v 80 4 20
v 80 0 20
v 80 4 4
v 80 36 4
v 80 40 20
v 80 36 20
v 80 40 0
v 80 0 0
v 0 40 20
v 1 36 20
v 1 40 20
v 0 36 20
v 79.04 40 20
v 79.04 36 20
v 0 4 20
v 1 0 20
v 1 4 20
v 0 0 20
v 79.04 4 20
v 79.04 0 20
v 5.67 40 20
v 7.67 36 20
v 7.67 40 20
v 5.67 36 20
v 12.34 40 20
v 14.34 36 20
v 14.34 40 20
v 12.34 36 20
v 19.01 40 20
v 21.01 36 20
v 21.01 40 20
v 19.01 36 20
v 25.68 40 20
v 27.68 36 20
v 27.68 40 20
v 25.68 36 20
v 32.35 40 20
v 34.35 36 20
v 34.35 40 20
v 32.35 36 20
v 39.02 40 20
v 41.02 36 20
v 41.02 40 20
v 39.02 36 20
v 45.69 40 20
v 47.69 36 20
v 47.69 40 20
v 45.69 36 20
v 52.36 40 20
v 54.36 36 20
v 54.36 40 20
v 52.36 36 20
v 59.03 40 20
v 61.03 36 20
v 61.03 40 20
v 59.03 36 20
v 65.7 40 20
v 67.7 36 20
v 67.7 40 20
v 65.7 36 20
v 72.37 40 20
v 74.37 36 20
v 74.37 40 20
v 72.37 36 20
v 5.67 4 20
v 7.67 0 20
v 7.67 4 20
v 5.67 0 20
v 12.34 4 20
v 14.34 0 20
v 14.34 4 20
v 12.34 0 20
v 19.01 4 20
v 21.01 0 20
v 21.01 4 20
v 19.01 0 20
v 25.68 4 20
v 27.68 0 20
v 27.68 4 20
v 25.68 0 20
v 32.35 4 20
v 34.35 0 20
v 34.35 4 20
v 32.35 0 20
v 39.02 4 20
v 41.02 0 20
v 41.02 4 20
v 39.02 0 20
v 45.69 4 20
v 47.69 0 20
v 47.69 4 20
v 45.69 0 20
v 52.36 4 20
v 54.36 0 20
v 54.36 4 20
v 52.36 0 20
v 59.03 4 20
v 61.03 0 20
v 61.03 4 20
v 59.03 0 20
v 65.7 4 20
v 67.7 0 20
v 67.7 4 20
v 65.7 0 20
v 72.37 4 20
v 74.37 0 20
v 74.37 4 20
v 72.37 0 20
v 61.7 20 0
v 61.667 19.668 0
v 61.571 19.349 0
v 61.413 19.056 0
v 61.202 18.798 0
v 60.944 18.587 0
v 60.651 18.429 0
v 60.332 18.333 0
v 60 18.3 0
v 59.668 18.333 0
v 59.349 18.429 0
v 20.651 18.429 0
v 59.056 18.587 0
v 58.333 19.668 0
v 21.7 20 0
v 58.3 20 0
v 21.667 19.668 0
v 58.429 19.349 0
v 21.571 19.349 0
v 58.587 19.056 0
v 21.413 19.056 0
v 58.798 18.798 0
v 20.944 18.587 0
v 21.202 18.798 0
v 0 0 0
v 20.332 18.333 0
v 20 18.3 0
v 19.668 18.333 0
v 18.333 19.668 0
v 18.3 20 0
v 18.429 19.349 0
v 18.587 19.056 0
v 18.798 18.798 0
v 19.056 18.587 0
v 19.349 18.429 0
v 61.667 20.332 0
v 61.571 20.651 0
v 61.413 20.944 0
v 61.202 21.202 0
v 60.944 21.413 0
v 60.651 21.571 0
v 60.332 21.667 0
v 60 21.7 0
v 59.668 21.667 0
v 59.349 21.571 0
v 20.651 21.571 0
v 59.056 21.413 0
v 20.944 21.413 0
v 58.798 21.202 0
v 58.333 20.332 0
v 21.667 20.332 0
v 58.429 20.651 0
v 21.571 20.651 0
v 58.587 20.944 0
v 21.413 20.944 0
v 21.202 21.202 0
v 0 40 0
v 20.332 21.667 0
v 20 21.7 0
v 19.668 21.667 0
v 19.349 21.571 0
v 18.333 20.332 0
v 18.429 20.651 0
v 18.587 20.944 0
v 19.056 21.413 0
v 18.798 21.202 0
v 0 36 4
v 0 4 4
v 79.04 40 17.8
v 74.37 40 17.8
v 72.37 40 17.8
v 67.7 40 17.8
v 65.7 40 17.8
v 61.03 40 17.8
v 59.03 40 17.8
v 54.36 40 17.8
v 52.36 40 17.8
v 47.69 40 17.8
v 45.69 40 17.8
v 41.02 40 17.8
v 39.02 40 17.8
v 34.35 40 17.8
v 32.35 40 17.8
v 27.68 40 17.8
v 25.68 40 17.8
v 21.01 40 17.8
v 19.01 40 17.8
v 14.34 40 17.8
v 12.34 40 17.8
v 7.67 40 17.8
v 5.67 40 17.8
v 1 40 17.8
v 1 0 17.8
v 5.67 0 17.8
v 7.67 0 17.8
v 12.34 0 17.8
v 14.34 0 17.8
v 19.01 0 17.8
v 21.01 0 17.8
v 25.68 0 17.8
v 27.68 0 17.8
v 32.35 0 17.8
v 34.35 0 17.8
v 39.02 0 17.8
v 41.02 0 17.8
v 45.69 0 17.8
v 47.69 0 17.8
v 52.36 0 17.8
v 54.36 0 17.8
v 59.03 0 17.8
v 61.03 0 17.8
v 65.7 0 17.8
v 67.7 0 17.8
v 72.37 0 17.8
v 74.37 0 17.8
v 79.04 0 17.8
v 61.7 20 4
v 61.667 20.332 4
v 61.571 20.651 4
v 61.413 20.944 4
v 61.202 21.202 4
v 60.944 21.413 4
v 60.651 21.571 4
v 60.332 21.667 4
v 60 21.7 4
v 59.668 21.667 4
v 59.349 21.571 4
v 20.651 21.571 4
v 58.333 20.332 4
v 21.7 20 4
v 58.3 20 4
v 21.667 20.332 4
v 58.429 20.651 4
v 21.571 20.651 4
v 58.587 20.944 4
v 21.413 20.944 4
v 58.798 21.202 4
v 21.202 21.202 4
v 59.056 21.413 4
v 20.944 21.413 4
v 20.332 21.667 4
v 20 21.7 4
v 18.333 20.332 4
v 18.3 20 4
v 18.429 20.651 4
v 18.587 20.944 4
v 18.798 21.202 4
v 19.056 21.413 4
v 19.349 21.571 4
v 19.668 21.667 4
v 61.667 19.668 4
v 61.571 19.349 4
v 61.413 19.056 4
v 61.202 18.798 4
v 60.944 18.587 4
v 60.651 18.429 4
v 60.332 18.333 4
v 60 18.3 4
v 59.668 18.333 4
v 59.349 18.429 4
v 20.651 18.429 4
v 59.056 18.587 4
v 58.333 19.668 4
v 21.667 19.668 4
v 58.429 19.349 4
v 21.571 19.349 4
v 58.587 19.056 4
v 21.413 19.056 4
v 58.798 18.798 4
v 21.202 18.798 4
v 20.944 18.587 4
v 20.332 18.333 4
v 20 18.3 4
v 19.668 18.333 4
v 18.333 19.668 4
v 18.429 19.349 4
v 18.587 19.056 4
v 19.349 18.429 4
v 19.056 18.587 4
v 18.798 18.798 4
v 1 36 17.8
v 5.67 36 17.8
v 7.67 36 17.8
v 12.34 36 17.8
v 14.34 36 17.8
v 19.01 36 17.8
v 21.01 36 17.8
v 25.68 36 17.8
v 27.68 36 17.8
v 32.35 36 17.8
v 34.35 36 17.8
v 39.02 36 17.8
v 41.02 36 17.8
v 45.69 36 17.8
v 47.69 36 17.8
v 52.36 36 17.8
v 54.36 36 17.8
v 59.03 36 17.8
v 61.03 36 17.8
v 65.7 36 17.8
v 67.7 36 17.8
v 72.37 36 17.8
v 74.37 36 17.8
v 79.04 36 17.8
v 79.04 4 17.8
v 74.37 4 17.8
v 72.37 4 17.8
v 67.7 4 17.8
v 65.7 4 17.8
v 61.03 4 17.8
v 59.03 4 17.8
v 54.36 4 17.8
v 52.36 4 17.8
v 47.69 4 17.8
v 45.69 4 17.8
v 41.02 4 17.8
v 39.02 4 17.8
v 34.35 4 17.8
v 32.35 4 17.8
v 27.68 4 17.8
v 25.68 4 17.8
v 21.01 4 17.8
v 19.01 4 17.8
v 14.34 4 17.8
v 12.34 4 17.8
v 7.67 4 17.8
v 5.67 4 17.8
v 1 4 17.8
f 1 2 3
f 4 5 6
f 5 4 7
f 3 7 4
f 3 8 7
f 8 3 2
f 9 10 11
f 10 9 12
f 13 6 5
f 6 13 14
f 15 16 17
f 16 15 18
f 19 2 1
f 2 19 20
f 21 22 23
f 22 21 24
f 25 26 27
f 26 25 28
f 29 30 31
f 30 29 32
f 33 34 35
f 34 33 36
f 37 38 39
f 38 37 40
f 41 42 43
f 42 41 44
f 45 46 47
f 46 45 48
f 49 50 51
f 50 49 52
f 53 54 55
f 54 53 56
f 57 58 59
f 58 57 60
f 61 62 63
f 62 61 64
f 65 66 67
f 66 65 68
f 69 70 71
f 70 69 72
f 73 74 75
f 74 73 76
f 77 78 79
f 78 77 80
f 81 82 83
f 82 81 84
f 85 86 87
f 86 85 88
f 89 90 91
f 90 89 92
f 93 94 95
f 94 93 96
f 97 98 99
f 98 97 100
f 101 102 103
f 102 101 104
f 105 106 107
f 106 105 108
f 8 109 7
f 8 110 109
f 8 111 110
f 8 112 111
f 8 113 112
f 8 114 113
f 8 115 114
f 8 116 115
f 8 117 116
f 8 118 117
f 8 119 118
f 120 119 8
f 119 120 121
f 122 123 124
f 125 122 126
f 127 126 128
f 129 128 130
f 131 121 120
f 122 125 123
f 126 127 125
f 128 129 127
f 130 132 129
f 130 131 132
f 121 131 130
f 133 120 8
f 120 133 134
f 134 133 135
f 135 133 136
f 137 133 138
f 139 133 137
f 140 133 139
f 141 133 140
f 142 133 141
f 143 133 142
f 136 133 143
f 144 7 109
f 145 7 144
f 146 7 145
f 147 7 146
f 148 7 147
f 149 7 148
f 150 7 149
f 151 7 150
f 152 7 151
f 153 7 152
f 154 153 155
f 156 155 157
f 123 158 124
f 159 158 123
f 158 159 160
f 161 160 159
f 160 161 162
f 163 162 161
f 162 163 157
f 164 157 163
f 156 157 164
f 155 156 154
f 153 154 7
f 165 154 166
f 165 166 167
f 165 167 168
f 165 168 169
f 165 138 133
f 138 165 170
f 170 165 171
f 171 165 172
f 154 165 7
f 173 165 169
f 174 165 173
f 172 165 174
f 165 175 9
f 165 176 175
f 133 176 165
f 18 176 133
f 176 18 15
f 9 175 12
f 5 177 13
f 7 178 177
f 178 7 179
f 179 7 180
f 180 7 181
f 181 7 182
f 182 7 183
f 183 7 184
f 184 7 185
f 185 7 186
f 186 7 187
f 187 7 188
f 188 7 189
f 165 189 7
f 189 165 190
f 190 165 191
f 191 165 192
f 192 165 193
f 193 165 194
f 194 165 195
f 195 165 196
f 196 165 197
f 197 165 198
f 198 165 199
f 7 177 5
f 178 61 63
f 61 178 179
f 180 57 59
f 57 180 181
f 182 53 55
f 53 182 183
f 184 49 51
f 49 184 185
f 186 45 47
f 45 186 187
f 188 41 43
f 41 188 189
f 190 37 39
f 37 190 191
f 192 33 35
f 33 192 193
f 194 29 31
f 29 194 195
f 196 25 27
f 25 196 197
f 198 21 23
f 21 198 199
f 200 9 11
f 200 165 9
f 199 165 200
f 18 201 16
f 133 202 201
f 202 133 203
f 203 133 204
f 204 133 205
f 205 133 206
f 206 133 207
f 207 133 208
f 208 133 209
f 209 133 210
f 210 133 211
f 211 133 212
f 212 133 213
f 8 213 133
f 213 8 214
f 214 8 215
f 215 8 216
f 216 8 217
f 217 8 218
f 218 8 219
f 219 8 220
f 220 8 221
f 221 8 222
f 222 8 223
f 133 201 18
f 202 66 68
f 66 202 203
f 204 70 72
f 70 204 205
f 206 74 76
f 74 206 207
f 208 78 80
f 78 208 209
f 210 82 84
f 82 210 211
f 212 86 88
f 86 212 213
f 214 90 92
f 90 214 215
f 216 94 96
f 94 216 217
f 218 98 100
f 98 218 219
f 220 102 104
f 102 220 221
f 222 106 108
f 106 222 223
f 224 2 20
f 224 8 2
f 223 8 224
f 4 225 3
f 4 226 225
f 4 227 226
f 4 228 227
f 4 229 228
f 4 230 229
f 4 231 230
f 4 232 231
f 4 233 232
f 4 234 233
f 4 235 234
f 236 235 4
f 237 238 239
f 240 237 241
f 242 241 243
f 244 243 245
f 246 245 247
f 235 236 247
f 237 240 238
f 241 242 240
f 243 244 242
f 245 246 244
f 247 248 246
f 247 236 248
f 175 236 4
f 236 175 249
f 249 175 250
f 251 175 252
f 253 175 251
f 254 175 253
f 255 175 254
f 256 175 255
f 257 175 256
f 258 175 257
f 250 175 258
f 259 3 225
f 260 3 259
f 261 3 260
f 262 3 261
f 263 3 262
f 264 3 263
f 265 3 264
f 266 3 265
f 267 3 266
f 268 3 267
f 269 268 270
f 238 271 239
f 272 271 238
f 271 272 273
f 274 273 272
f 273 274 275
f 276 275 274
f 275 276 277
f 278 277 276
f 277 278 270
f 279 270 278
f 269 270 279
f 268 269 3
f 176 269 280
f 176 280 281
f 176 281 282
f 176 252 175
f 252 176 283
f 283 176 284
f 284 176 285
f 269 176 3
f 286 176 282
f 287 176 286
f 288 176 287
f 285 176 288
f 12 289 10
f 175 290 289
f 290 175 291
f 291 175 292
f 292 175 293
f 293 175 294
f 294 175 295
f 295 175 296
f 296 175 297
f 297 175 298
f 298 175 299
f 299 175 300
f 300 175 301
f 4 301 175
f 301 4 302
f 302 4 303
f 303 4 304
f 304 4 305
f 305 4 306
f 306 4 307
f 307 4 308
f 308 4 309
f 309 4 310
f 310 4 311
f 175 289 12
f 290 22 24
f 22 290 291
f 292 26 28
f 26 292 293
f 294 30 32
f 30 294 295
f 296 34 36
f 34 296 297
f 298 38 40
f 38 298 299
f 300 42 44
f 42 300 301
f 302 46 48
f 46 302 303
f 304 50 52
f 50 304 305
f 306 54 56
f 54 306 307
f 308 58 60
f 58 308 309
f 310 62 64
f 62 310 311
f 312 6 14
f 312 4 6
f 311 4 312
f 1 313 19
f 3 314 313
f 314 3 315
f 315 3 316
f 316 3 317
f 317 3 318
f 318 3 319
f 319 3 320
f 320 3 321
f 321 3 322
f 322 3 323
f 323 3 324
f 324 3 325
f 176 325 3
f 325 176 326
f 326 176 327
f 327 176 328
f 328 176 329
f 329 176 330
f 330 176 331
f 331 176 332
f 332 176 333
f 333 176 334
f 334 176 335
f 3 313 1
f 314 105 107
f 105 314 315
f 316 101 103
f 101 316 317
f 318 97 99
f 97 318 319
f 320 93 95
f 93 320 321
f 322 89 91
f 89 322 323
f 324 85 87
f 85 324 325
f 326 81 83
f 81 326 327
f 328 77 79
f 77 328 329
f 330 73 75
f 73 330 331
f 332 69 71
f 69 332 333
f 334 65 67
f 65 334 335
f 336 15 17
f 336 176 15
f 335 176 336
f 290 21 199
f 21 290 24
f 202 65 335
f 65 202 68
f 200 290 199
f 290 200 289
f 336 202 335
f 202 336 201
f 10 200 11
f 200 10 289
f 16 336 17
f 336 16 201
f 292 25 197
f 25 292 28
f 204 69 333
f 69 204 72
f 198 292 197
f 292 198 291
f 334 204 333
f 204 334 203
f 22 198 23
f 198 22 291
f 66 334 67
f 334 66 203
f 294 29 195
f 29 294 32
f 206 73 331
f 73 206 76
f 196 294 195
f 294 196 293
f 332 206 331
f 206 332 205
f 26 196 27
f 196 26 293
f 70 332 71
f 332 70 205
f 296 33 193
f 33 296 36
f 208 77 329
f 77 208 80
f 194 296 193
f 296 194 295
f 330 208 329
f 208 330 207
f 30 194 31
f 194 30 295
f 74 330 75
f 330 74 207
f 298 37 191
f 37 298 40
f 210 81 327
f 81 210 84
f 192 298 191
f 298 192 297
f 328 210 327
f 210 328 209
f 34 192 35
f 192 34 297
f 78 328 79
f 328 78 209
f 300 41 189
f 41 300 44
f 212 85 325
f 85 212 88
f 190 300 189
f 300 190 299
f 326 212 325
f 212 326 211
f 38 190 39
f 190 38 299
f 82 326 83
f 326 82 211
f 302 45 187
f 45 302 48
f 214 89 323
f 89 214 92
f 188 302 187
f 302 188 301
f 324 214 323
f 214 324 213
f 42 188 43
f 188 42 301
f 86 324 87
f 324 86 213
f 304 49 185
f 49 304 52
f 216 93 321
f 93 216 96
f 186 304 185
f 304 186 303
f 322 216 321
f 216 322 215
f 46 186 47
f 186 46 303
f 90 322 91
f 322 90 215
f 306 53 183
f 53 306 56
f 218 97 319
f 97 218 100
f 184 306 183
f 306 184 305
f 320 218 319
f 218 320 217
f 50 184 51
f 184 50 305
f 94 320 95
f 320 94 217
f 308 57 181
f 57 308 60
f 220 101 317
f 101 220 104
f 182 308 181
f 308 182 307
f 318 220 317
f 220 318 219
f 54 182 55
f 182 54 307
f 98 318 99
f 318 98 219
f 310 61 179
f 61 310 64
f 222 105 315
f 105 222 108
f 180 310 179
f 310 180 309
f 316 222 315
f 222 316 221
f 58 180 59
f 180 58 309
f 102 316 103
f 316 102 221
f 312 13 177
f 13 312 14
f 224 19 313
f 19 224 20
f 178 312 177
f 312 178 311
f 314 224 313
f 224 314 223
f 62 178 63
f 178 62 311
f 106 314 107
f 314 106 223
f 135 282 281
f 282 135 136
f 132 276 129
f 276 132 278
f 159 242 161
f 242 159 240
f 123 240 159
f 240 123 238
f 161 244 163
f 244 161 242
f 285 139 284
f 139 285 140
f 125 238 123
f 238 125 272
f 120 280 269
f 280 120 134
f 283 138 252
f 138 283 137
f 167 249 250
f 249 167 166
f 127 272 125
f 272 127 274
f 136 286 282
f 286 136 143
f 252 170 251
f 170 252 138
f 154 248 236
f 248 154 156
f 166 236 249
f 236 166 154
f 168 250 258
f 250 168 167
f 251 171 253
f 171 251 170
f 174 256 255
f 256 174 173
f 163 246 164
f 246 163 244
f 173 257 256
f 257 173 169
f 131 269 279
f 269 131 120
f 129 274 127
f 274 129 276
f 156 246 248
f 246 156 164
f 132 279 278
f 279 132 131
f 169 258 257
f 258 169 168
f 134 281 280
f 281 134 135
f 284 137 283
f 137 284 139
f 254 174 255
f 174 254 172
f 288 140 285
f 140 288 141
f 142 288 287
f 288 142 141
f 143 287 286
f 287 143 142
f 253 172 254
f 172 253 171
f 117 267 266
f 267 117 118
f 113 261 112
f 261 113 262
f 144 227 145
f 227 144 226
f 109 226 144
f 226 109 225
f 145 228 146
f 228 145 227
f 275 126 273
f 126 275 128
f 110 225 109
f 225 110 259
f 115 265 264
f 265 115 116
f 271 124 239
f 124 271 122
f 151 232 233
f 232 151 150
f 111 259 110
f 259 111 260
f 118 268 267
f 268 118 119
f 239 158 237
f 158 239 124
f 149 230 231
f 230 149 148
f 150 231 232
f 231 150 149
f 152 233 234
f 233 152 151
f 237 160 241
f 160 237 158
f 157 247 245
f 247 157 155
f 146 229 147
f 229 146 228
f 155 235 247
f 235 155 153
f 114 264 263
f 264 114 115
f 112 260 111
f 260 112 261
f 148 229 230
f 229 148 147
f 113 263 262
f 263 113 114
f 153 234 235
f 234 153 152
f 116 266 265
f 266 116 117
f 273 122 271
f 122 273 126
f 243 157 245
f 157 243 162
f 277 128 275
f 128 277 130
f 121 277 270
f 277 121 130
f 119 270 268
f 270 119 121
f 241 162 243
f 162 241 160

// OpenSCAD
$fn = 32;

// ----------------------------------------------------------------------
// Cable duct: 80 x 40 x 20 mm, 12 fingers
// ----------------------------------------------------------------------

// --- parameters (mm) ---
duct_len = 80;            // duct length, X
duct_w = 40;              // duct width, Y
duct_h = 20;              // duct height, Z
wall_t = 4;               // side wall thickness
floor_t = 4;              // floor thickness
slot_w = 4.67;            // finger slot width
slot_h = 13.8;            // finger slot height
fingers = 12;             // number of finger slots per side
pitch = 6.67;             // finger pitch
hole_d = 3.4;             // floor mounting hole
hole_n = 2;               // mounting holes in the floor

module shell() {
  difference() {
    cube([duct_len, duct_w, duct_h]);
    /* open top channel */
    translate([-wall_t - 1, wall_t, floor_t])
      cube([duct_len + 2 * wall_t + 2, duct_w - 2 * wall_t, duct_h + 1]);
  }
}

difference() {
  union() {
    shell();
  }
  /* finger slots cut through both side walls */
  for (i = [0 : fingers - 1]) translate([pitch / 2 + i * pitch - slot_w / 2, -1, floor_t + slot_h]) cube([slot_w, duct_w + 2, duct_h]);
  for (i = [0 : hole_n - 1]) translate([(duct_len / hole_n) * (i + 0.5), duct_w / 2, -1]) cylinder(h = floor_t + 2, d = hole_d);
}
